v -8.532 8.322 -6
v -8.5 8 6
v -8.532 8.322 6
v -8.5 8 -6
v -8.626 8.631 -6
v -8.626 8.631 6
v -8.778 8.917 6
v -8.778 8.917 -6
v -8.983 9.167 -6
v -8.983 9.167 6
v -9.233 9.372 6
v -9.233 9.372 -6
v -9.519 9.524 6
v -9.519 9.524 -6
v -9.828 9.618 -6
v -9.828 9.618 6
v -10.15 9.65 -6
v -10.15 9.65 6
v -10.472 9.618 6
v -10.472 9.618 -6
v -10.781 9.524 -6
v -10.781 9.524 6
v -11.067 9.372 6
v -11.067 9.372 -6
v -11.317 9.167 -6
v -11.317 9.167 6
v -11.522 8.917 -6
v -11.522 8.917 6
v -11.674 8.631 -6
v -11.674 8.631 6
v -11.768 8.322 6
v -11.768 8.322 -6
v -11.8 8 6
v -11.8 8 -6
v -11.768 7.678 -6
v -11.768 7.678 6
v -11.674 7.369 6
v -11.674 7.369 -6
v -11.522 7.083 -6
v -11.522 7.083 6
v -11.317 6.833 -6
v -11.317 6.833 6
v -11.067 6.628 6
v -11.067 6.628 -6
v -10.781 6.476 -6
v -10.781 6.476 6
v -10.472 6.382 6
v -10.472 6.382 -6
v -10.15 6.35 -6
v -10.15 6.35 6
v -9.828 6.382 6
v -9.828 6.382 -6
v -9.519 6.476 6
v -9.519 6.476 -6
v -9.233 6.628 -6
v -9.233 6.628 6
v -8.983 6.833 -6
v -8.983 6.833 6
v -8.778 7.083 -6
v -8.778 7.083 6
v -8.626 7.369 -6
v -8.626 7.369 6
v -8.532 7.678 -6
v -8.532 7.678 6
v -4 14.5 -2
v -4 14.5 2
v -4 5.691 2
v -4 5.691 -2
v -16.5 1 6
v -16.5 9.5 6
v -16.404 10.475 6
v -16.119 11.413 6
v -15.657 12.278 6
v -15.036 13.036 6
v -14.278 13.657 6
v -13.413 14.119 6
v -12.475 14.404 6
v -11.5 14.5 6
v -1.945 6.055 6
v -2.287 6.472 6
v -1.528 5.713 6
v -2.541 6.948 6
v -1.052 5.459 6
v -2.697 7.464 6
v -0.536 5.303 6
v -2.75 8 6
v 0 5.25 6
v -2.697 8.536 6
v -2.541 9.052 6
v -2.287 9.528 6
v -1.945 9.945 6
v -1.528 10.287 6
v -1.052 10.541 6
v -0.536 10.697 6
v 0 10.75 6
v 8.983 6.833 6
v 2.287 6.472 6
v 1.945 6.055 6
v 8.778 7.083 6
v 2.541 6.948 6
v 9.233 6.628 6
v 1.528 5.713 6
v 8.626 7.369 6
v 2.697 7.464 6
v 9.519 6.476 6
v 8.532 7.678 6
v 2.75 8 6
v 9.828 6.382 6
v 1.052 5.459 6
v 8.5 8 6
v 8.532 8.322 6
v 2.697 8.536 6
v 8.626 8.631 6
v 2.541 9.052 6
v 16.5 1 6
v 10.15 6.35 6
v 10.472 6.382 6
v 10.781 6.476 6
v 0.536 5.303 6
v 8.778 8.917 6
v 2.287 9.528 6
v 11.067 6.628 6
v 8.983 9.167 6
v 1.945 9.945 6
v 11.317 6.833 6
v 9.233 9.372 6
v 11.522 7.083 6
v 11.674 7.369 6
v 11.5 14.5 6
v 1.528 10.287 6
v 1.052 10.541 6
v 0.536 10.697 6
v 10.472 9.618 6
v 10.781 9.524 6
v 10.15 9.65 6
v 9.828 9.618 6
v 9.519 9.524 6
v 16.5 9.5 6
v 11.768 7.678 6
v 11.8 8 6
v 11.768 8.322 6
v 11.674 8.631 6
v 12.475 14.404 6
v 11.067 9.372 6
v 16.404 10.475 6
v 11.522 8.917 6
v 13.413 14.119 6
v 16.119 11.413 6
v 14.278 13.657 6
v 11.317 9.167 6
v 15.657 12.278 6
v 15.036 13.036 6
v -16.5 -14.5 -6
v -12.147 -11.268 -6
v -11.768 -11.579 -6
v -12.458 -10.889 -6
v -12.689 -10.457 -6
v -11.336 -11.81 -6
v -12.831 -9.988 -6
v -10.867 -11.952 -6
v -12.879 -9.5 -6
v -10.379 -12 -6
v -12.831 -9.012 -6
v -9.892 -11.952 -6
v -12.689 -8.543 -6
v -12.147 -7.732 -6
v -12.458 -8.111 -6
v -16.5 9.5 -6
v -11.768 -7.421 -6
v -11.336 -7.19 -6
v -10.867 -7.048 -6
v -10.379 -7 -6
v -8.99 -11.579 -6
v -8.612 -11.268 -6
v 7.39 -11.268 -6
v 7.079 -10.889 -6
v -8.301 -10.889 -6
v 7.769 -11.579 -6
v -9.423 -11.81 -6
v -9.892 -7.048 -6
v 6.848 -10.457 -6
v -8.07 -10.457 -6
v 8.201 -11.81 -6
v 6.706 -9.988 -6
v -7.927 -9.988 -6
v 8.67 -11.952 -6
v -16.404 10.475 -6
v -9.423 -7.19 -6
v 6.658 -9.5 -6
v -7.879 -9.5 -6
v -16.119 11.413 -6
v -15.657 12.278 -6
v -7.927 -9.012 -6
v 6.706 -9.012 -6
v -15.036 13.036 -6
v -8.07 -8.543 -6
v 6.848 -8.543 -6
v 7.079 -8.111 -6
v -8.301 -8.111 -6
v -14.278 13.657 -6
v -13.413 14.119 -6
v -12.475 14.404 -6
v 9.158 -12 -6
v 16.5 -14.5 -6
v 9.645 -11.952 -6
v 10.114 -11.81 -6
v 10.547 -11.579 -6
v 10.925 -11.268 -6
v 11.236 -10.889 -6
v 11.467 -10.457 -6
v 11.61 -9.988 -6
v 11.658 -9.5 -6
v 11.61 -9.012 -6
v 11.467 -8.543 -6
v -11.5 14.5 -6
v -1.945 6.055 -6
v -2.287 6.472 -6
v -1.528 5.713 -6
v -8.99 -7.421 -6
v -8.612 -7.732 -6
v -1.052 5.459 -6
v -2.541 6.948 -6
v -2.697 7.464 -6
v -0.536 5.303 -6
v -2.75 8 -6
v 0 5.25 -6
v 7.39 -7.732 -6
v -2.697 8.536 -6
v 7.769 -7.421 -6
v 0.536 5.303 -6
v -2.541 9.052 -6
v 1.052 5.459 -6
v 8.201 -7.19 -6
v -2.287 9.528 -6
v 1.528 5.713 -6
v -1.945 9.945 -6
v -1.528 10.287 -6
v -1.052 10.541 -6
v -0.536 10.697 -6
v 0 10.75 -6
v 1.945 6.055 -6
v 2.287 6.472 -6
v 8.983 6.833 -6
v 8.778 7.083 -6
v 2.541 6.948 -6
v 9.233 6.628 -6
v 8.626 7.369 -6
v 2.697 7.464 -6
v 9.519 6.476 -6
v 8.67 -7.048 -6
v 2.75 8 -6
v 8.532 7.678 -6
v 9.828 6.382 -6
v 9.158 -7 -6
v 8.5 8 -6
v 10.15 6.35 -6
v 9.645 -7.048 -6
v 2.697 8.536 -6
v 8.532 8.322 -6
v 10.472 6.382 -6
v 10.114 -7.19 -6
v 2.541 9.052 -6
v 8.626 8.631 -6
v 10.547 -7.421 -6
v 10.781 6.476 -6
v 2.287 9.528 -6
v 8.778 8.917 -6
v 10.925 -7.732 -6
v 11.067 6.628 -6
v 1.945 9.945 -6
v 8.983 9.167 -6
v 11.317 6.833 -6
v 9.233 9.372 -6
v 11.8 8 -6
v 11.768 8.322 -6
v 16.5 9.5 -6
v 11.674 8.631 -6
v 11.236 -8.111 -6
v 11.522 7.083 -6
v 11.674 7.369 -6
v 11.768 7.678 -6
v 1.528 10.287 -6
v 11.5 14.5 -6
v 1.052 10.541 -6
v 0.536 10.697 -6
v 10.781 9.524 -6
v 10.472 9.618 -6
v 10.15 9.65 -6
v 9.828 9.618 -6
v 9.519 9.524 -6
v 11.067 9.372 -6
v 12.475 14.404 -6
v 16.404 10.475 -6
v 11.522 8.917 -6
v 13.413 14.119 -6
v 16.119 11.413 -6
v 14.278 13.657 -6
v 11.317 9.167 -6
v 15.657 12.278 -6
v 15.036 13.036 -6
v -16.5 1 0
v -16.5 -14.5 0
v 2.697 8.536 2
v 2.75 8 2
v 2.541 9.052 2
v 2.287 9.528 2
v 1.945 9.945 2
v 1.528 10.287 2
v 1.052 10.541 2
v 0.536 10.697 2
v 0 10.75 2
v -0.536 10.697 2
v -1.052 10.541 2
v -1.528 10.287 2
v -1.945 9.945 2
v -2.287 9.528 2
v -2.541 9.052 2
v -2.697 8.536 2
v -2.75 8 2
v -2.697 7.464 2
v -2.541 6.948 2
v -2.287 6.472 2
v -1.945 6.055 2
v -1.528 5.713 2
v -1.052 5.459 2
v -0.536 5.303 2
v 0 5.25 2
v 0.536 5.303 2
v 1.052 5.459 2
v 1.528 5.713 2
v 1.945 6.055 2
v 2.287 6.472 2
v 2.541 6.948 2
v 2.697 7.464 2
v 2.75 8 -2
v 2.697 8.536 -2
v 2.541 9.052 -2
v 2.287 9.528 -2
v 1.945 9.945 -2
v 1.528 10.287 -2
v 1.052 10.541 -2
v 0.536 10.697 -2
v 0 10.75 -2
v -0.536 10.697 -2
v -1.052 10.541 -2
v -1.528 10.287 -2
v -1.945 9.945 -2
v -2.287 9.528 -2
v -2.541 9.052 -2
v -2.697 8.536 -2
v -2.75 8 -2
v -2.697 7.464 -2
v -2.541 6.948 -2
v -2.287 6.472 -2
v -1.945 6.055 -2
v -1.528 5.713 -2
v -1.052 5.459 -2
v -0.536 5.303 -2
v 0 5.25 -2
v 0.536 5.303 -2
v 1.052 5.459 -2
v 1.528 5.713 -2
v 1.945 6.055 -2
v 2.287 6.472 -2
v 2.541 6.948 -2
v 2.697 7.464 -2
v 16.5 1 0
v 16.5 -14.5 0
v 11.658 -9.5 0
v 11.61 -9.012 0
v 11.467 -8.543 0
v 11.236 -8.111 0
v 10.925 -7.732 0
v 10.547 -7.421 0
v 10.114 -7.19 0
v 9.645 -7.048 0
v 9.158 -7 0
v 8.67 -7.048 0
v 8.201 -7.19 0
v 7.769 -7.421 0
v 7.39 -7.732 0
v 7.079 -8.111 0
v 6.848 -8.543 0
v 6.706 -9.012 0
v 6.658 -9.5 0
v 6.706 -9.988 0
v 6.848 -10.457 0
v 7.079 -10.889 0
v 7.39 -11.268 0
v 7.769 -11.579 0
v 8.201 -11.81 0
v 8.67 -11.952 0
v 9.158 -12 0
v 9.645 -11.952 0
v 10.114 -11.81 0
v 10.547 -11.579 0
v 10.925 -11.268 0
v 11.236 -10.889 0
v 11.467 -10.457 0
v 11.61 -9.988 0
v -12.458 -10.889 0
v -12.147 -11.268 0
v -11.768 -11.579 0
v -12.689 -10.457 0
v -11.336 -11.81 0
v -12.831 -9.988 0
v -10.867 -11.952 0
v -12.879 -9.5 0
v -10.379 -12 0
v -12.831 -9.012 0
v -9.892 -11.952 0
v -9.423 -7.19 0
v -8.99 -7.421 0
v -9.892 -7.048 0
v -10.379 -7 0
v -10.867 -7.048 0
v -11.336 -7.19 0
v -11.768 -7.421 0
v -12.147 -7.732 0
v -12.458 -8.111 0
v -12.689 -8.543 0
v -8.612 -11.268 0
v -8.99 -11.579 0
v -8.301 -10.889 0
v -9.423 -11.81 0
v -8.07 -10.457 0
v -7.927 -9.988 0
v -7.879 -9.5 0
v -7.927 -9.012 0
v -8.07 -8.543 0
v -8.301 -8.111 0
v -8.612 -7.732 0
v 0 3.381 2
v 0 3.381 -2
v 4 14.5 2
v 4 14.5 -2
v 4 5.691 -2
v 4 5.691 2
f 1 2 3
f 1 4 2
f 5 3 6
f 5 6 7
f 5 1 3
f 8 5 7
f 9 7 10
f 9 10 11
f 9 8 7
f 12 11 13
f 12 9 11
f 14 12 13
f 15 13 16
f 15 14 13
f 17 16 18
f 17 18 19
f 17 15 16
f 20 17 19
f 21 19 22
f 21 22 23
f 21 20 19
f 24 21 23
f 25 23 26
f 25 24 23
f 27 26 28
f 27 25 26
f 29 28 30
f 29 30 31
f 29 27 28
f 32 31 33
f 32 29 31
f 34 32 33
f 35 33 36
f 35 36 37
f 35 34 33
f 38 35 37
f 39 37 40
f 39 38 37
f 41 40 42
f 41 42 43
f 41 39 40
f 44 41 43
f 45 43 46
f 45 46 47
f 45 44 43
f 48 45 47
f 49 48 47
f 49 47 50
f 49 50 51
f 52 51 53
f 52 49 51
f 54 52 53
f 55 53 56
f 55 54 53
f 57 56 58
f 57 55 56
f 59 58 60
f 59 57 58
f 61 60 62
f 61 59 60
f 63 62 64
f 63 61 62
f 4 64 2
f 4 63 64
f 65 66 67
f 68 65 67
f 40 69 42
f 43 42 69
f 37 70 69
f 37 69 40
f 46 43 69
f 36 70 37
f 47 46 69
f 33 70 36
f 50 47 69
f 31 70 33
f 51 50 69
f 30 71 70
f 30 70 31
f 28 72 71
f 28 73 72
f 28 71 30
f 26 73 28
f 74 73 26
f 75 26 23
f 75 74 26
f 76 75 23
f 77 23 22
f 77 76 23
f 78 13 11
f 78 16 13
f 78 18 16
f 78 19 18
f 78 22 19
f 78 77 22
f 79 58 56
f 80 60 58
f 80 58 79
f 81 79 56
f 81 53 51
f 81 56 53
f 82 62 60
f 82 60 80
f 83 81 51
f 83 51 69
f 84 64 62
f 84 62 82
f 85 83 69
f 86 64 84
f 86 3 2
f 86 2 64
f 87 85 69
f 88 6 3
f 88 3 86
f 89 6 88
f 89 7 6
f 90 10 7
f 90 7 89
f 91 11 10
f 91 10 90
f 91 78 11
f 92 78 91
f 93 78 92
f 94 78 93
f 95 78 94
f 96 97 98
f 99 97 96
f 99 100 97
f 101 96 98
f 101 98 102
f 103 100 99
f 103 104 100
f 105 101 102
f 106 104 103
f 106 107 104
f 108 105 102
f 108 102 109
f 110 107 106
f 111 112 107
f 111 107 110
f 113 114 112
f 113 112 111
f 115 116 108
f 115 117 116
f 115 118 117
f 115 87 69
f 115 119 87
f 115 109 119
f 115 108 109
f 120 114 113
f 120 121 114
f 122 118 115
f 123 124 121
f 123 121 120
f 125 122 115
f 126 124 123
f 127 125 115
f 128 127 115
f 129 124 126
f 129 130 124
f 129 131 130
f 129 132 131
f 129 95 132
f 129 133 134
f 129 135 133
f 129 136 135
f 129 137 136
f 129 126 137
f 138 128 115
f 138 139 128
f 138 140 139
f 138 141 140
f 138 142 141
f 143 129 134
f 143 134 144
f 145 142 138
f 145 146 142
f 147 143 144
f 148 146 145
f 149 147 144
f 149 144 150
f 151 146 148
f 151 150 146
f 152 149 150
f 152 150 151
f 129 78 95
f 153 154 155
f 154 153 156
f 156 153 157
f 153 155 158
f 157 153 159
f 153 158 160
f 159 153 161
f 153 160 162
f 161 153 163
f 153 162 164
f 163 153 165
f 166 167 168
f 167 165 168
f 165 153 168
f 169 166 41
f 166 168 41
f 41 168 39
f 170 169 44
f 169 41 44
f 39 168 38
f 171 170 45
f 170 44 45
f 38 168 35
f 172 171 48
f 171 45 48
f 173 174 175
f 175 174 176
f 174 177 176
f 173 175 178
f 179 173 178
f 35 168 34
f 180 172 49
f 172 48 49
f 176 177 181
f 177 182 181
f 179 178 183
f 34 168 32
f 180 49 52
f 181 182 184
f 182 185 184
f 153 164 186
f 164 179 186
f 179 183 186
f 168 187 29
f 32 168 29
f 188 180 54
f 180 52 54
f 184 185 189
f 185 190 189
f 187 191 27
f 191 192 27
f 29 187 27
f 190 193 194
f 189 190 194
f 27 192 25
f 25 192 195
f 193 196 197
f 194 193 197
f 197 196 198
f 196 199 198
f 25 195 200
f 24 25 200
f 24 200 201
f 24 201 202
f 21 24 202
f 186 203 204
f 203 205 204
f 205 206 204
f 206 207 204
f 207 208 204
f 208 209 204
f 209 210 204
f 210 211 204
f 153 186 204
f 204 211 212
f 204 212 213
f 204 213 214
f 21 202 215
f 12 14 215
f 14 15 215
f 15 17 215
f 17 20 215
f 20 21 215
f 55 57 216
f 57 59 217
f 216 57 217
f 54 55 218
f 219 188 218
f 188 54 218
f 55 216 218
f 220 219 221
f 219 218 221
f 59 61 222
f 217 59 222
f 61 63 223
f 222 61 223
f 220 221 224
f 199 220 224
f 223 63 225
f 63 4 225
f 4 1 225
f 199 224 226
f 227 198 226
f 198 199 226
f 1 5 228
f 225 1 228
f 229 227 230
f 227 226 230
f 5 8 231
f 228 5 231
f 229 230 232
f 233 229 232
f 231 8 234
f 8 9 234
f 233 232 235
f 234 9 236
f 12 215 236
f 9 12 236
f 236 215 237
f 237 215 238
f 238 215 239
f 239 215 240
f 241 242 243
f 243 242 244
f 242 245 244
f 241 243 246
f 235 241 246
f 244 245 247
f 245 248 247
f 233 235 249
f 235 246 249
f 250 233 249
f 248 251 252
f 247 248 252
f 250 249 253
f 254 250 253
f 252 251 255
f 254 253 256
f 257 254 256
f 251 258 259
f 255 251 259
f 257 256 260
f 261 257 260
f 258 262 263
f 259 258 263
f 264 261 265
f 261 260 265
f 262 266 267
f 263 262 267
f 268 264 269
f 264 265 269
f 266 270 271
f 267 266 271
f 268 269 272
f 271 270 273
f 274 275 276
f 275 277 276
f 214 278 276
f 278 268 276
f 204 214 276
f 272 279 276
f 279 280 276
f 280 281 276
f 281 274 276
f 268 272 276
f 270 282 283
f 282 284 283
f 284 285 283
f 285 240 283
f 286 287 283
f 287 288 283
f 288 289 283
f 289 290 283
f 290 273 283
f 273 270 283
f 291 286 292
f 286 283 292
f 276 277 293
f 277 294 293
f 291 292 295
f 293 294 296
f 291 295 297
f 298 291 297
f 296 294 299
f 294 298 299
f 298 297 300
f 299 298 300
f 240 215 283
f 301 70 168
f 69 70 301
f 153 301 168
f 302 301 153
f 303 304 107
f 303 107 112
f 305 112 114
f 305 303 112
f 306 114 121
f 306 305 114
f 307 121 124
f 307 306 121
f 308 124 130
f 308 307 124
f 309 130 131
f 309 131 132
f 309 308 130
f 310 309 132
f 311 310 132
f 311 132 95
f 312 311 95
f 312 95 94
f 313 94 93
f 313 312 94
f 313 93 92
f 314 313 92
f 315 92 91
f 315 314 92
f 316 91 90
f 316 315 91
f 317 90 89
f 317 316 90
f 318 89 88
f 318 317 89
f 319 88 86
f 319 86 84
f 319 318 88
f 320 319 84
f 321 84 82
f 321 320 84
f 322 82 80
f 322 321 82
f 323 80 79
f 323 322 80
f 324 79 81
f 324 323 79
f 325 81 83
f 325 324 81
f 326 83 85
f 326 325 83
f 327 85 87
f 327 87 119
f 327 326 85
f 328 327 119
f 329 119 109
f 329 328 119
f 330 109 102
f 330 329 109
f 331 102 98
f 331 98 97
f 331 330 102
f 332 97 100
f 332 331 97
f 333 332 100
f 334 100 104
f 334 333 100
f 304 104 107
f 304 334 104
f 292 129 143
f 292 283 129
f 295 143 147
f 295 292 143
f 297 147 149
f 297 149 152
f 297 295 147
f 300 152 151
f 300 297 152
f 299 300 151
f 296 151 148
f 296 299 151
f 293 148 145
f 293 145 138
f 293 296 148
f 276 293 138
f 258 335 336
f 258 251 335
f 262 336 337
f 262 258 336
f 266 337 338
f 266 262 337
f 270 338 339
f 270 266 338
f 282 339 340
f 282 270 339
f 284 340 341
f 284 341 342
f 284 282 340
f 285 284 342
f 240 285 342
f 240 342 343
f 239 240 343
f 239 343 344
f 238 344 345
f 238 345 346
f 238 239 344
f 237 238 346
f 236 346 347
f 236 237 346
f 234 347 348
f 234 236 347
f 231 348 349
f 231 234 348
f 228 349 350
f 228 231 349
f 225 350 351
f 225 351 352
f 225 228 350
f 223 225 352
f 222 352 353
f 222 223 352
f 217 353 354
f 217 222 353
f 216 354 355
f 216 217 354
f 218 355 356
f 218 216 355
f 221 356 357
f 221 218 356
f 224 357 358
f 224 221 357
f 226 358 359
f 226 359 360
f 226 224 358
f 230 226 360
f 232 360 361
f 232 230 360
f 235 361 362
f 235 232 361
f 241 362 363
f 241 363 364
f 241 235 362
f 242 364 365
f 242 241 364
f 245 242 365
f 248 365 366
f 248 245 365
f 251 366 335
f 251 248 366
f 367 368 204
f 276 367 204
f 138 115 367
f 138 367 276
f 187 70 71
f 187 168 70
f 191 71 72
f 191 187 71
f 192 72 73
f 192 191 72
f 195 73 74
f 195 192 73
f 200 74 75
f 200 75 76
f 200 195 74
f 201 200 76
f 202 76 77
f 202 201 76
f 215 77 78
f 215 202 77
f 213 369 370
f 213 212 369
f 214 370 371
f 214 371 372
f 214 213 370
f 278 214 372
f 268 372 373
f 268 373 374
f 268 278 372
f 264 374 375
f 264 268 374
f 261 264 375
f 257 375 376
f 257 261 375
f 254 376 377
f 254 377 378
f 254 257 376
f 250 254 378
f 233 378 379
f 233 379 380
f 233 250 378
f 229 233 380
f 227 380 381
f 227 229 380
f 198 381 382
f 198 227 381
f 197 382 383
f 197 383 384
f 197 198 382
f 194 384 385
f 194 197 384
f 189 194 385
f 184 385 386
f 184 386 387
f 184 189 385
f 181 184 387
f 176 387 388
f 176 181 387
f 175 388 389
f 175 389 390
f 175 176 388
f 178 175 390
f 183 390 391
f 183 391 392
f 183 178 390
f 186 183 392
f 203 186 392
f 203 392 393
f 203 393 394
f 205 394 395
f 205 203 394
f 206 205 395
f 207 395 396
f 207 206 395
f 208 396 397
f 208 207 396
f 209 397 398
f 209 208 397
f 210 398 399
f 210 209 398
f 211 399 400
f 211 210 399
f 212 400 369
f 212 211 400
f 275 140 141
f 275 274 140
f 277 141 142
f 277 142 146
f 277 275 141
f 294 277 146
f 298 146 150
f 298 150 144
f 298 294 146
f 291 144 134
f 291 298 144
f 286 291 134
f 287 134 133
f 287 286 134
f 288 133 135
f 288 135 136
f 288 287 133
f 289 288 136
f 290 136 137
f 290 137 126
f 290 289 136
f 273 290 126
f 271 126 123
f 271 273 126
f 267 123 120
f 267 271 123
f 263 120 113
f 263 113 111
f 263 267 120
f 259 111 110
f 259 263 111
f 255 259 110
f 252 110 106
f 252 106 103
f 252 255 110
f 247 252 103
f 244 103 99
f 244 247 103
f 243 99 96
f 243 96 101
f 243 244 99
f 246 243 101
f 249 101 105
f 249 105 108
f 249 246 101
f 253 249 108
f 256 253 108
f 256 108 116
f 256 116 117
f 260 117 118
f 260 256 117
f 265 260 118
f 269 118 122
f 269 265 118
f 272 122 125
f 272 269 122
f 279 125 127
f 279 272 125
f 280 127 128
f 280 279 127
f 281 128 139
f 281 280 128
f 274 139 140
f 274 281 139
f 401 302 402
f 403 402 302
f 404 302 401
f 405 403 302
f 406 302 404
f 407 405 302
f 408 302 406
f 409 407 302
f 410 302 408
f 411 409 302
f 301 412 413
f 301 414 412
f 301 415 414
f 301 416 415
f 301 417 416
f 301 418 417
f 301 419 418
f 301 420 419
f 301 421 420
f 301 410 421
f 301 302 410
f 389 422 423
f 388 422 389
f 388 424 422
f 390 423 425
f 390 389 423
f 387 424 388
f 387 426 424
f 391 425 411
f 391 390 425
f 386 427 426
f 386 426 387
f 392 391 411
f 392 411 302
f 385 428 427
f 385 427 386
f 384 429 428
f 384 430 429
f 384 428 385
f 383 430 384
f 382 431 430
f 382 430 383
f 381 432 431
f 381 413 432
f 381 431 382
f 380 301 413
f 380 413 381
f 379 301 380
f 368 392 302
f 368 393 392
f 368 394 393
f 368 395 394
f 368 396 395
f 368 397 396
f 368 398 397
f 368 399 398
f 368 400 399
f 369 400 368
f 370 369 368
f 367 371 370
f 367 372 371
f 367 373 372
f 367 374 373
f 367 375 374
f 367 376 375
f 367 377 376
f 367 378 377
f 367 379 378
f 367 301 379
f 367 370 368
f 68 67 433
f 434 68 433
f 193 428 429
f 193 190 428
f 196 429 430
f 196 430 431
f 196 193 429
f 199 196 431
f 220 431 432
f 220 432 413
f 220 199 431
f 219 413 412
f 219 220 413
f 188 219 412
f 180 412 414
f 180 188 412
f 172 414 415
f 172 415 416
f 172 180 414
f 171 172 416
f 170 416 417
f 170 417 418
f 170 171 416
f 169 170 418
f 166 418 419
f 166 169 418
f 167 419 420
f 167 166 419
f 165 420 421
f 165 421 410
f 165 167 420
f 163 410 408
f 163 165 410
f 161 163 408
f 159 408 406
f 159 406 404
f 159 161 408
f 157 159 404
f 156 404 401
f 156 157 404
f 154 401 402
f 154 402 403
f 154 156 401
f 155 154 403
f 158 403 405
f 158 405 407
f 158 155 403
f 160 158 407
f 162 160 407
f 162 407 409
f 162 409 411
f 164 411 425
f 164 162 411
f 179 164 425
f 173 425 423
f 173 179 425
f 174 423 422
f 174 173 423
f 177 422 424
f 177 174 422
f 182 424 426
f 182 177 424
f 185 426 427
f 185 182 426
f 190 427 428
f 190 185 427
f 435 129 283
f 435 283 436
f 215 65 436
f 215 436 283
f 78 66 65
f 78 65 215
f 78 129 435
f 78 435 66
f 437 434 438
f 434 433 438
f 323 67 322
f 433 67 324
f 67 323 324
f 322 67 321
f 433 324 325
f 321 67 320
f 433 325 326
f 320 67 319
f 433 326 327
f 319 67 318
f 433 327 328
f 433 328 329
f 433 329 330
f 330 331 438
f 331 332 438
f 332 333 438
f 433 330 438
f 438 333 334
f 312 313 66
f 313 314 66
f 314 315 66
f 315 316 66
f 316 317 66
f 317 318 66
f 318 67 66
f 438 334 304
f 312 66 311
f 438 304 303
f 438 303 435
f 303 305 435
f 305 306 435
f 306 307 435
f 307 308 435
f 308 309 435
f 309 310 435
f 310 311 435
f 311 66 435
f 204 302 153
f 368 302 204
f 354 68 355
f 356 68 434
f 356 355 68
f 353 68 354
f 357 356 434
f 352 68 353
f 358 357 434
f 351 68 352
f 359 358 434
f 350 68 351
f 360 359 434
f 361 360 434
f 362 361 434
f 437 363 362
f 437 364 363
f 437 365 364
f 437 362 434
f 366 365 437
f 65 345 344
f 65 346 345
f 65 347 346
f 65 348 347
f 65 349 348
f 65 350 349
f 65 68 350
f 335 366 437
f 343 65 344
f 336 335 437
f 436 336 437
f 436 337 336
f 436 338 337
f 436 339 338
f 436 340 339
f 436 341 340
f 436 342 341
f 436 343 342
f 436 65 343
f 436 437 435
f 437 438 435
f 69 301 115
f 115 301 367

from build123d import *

# Parameters (mm, degrees)
F0_R     = 2.75
F0_R_2   = 1.65
F0_W     = 33
F0_H     = 15.5
F0_R_3   = 2.5
F1_DEPTH = 6
F2_R     = 5
F3_DEPTH = 2
F4_DEPTH = 25


with BuildPart() as f1:
    # F0 (on Top) → F1 (new body, symmetric)
    with BuildSketch(Plane.XY):
        Polygon((4, 14.5), (-4, 14.5), (-4, 10.123076), (-4, 5.690599), (0, 3.381198), (4, 5.690599), (4, 10.309401), align=None)
        with Locations((0, 8)):
            Circle(F0_R, mode=Mode.SUBTRACT)
        Polygon((-4, 14.5), (-16.5, 14.5), (-16.5, 1), (16.5, 1), (16.5, 14.5), (4, 14.5), (4, 10.309401), (4, 5.690599), (0, 3.381198), (-4, 5.690599), (-4, 10.123076), align=None)
        with Locations((-10.15, 8)):
            Circle(F0_R_2, mode=Mode.SUBTRACT)
        with Locations((10.15, 8)):
            Circle(F0_R_2, mode=Mode.SUBTRACT)
        with Locations((0, -6.75)):
            Rectangle(F0_W, F0_H)
        with Locations((-10.379309, -9.5)):
            Circle(F0_R_3, mode=Mode.SUBTRACT)
        with Locations((9.157613, -9.5)):
            Circle(F0_R_3, mode=Mode.SUBTRACT)
    extrude(amount=F1_DEPTH, both=True)

    # F2
    f2_edges = [f1.edges().sort_by_distance(p)[0] for p in [
        (16.5, 14.5, 0),
        (-16.5, 14.5, 0),
    ]]
    fillet(f2_edges, radius=F2_R)

    # F0 (on Top) → F3 (cut, symmetric)
    with BuildSketch(Plane.XY):
        Polygon((4, 14.5), (-4, 14.5), (-4, 10.123076), (-4, 5.690599), (0, 3.381198), (4, 5.690599), (4, 10.309401), align=None)
        with Locations((0, 8)):
            Circle(F0_R, mode=Mode.SUBTRACT)
    extrude(amount=F3_DEPTH, both=True, mode=Mode.SUBTRACT)

    # F0 (on Top) → F4 (cut)
    with BuildSketch(Plane.XY):
        with Locations((0, -6.75)):
            Rectangle(F0_W, F0_H)
        with Locations((-10.379309, -9.5)):
            Circle(F0_R_3, mode=Mode.SUBTRACT)
        with Locations((9.157613, -9.5)):
            Circle(F0_R_3, mode=Mode.SUBTRACT)
    extrude(amount=F4_DEPTH, mode=Mode.SUBTRACT)


solid = f1.part
